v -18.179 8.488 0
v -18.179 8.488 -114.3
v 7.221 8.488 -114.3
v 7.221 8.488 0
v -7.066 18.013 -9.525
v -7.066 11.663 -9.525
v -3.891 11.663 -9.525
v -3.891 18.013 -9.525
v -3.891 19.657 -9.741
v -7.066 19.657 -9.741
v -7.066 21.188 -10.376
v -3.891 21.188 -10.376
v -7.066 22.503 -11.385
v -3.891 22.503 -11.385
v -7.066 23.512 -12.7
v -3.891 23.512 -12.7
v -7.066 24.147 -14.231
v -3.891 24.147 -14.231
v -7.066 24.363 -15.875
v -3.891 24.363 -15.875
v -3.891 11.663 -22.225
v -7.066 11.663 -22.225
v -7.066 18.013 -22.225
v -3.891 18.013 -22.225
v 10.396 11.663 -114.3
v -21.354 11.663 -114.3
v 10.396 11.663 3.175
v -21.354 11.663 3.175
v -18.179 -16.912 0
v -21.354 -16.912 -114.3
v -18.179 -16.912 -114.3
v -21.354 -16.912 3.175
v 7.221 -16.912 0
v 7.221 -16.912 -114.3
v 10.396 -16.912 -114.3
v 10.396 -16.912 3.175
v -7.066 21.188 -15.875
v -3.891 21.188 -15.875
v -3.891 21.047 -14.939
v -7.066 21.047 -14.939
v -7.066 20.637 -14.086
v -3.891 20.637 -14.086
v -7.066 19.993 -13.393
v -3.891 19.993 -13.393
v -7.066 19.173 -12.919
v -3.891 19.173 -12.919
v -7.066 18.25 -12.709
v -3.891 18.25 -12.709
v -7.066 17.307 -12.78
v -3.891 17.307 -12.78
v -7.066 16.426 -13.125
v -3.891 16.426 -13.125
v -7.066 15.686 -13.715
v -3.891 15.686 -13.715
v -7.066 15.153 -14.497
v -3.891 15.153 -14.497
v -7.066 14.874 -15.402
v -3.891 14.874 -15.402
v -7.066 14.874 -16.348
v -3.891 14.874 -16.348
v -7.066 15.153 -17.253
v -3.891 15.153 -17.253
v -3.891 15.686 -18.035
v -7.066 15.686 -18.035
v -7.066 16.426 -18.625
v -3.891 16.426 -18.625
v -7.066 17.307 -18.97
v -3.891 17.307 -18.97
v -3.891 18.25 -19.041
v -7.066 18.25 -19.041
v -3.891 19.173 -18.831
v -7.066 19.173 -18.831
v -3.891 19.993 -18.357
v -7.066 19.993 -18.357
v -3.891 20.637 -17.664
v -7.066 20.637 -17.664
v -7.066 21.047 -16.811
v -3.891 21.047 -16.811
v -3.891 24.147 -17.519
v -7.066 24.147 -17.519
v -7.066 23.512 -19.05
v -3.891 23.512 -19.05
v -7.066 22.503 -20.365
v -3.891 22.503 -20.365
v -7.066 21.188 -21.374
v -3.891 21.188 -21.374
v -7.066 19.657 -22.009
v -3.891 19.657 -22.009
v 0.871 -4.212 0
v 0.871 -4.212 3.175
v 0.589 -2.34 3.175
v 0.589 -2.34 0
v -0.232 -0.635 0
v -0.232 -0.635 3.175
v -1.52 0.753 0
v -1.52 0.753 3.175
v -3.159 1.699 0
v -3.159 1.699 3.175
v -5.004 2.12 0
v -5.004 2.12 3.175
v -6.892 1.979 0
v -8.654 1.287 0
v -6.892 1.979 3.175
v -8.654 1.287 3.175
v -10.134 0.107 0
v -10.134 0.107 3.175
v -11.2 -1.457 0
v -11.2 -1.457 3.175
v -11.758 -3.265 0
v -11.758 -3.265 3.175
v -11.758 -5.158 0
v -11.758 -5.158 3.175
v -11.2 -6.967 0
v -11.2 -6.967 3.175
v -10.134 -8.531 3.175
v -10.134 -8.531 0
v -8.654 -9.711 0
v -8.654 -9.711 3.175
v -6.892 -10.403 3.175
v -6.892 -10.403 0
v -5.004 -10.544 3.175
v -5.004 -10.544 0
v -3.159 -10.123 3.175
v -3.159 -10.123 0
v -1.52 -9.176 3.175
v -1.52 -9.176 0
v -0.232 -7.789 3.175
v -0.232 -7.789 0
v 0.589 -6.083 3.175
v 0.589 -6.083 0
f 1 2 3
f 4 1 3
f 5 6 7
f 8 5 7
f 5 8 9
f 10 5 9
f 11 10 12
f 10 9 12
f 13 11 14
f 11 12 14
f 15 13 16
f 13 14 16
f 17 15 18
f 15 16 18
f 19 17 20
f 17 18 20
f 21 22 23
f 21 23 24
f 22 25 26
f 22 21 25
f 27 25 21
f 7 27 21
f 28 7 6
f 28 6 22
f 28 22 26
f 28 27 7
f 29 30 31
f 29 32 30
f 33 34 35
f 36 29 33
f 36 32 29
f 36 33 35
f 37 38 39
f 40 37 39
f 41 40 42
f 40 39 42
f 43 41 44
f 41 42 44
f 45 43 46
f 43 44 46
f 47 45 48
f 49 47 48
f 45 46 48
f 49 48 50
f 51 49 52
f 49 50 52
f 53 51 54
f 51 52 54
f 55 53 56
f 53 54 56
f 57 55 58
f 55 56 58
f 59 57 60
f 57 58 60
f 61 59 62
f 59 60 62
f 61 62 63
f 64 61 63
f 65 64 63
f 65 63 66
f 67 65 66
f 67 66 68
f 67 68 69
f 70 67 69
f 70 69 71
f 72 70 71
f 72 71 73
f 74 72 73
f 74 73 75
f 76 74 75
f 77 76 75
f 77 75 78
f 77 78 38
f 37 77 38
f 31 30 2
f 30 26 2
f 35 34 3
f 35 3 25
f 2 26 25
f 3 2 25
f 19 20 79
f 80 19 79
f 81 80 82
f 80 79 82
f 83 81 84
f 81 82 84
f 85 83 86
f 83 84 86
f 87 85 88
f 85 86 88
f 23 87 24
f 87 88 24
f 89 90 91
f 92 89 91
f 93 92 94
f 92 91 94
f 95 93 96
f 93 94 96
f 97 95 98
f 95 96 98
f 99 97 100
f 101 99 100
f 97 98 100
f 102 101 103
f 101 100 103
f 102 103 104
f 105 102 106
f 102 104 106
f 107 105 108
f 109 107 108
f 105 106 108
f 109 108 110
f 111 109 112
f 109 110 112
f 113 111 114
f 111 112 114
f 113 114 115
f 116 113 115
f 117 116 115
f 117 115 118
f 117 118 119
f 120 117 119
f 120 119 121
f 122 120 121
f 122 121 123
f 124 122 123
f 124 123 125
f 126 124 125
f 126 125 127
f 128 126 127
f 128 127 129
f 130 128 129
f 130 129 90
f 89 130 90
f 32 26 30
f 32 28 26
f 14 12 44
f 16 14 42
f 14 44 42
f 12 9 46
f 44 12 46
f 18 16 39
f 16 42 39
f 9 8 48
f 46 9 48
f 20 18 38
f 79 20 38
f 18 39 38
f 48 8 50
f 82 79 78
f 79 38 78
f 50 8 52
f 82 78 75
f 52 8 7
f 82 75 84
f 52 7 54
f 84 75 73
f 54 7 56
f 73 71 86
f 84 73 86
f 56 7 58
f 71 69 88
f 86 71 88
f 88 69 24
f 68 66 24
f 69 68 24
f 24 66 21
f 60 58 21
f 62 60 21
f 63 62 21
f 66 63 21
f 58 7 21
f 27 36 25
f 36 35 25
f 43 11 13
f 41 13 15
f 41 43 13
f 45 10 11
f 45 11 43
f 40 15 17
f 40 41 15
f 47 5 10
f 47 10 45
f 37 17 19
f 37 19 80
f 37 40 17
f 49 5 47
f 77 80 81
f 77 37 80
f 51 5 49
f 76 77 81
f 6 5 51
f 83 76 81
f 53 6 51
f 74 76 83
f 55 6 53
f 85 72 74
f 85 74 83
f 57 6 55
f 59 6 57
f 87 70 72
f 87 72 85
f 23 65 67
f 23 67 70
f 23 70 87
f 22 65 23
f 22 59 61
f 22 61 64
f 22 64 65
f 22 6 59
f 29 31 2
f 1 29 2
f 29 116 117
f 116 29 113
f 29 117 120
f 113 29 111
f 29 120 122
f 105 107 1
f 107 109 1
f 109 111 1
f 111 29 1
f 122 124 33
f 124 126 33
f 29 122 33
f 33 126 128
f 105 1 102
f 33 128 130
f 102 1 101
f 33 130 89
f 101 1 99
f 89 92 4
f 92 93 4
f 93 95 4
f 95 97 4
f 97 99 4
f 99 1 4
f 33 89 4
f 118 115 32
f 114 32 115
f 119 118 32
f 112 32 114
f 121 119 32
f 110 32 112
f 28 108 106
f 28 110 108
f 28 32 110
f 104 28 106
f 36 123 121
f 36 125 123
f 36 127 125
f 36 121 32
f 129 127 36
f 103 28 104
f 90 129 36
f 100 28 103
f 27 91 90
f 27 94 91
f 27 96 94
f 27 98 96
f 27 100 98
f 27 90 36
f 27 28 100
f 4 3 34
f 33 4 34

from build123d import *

# Parameters (mm, degrees)
SKETCH1_W           = 31.75
SKETCH1_H           = 28.575
BOSS_EXTRUDE1_DEPTH = 3.175
SKETCH2_R           = 6.35
CUT_EXTRUDE1_DEPTH  = 28.423991451
BOSS_EXTRUDE2_DEPTH = 114.3
SKETCH4_W           = 3.175
SKETCH4_H           = 12.7
BOSS_EXTRUDE3_DEPTH = 12.7
SKETCH5_R           = 3.175
CUT_EXTRUDE2_DEPTH  = 119.165117032


with BuildPart() as part:
    # Sketch1 → Boss-Extrude1 (new body)
    with BuildSketch(Plane.XY):
        with Locations((-5.47882926, -2.624290504)):
            Rectangle(SKETCH1_W, SKETCH1_H)
    extrude(amount=BOSS_EXTRUDE1_DEPTH)

    # Sketch2 → Cut-Extrude1 (cut, through all)
    with BuildSketch(Plane.XY.offset(3.175)):
        with Locations((-5.47882926, -4.211790504)):
            Circle(SKETCH2_R)
    extrude(amount=-CUT_EXTRUDE1_DEPTH, mode=Mode.SUBTRACT)

    # Sketch3 → Boss-Extrude2 (add)
    with BuildSketch(Plane(origin=(0, 0, 0), x_dir=(-1, 0, 0), z_dir=(0, 0, -1))):
        Polygon((21.35382926, -16.911790504), (18.17882926, -16.911790504), (18.17882926, 8.488209496), (-7.22117074, 8.488209496), (-7.22117074, -16.911790504), (-10.39617074, -16.911790504), (-10.39617074, 11.663209496), (21.35382926, 11.663209496), align=None)
    extrude(amount=BOSS_EXTRUDE2_DEPTH)

    # Sketch4 → Boss-Extrude3 (add)
    with BuildSketch(Plane(origin=(0, 11.663209496, 0), x_dir=(1, 0, 0), z_dir=(0, 1, 0))):
        with Locations((-5.47882926, 15.875)):
            Rectangle(SKETCH4_W, SKETCH4_H)
    extrude(amount=BOSS_EXTRUDE3_DEPTH)

    # Sketch5 → Cut-Extrude2 (cut, through all)
    with BuildSketch(Plane(origin=(-3.89132926, 0, 0), x_dir=(0, 0, -1), z_dir=(1, 0, 0))):
        with BuildLine():
            ThreePointArc((15.875, 24.363209496), (20.365128061, 22.503337556), (22.225, 18.013209496))
            Line((22.225, 18.013209496), (22.225, 24.363209496))
            Line((22.225, 24.363209496), (15.875, 24.363209496))
        make_face()
        with BuildLine():
            ThreePointArc((9.525, 18.013209496), (11.384871939, 22.503337556), (15.875, 24.363209496))
            Line((15.875, 24.363209496), (9.525, 24.363209496))
            Line((9.525, 24.363209496), (9.525, 18.013209496))
        make_face()
        with Locations((15.875, 18.013209496)):
            Circle(SKETCH5_R)
    extrude(amount=-CUT_EXTRUDE2_DEPTH, mode=Mode.SUBTRACT)


solid = part.part
